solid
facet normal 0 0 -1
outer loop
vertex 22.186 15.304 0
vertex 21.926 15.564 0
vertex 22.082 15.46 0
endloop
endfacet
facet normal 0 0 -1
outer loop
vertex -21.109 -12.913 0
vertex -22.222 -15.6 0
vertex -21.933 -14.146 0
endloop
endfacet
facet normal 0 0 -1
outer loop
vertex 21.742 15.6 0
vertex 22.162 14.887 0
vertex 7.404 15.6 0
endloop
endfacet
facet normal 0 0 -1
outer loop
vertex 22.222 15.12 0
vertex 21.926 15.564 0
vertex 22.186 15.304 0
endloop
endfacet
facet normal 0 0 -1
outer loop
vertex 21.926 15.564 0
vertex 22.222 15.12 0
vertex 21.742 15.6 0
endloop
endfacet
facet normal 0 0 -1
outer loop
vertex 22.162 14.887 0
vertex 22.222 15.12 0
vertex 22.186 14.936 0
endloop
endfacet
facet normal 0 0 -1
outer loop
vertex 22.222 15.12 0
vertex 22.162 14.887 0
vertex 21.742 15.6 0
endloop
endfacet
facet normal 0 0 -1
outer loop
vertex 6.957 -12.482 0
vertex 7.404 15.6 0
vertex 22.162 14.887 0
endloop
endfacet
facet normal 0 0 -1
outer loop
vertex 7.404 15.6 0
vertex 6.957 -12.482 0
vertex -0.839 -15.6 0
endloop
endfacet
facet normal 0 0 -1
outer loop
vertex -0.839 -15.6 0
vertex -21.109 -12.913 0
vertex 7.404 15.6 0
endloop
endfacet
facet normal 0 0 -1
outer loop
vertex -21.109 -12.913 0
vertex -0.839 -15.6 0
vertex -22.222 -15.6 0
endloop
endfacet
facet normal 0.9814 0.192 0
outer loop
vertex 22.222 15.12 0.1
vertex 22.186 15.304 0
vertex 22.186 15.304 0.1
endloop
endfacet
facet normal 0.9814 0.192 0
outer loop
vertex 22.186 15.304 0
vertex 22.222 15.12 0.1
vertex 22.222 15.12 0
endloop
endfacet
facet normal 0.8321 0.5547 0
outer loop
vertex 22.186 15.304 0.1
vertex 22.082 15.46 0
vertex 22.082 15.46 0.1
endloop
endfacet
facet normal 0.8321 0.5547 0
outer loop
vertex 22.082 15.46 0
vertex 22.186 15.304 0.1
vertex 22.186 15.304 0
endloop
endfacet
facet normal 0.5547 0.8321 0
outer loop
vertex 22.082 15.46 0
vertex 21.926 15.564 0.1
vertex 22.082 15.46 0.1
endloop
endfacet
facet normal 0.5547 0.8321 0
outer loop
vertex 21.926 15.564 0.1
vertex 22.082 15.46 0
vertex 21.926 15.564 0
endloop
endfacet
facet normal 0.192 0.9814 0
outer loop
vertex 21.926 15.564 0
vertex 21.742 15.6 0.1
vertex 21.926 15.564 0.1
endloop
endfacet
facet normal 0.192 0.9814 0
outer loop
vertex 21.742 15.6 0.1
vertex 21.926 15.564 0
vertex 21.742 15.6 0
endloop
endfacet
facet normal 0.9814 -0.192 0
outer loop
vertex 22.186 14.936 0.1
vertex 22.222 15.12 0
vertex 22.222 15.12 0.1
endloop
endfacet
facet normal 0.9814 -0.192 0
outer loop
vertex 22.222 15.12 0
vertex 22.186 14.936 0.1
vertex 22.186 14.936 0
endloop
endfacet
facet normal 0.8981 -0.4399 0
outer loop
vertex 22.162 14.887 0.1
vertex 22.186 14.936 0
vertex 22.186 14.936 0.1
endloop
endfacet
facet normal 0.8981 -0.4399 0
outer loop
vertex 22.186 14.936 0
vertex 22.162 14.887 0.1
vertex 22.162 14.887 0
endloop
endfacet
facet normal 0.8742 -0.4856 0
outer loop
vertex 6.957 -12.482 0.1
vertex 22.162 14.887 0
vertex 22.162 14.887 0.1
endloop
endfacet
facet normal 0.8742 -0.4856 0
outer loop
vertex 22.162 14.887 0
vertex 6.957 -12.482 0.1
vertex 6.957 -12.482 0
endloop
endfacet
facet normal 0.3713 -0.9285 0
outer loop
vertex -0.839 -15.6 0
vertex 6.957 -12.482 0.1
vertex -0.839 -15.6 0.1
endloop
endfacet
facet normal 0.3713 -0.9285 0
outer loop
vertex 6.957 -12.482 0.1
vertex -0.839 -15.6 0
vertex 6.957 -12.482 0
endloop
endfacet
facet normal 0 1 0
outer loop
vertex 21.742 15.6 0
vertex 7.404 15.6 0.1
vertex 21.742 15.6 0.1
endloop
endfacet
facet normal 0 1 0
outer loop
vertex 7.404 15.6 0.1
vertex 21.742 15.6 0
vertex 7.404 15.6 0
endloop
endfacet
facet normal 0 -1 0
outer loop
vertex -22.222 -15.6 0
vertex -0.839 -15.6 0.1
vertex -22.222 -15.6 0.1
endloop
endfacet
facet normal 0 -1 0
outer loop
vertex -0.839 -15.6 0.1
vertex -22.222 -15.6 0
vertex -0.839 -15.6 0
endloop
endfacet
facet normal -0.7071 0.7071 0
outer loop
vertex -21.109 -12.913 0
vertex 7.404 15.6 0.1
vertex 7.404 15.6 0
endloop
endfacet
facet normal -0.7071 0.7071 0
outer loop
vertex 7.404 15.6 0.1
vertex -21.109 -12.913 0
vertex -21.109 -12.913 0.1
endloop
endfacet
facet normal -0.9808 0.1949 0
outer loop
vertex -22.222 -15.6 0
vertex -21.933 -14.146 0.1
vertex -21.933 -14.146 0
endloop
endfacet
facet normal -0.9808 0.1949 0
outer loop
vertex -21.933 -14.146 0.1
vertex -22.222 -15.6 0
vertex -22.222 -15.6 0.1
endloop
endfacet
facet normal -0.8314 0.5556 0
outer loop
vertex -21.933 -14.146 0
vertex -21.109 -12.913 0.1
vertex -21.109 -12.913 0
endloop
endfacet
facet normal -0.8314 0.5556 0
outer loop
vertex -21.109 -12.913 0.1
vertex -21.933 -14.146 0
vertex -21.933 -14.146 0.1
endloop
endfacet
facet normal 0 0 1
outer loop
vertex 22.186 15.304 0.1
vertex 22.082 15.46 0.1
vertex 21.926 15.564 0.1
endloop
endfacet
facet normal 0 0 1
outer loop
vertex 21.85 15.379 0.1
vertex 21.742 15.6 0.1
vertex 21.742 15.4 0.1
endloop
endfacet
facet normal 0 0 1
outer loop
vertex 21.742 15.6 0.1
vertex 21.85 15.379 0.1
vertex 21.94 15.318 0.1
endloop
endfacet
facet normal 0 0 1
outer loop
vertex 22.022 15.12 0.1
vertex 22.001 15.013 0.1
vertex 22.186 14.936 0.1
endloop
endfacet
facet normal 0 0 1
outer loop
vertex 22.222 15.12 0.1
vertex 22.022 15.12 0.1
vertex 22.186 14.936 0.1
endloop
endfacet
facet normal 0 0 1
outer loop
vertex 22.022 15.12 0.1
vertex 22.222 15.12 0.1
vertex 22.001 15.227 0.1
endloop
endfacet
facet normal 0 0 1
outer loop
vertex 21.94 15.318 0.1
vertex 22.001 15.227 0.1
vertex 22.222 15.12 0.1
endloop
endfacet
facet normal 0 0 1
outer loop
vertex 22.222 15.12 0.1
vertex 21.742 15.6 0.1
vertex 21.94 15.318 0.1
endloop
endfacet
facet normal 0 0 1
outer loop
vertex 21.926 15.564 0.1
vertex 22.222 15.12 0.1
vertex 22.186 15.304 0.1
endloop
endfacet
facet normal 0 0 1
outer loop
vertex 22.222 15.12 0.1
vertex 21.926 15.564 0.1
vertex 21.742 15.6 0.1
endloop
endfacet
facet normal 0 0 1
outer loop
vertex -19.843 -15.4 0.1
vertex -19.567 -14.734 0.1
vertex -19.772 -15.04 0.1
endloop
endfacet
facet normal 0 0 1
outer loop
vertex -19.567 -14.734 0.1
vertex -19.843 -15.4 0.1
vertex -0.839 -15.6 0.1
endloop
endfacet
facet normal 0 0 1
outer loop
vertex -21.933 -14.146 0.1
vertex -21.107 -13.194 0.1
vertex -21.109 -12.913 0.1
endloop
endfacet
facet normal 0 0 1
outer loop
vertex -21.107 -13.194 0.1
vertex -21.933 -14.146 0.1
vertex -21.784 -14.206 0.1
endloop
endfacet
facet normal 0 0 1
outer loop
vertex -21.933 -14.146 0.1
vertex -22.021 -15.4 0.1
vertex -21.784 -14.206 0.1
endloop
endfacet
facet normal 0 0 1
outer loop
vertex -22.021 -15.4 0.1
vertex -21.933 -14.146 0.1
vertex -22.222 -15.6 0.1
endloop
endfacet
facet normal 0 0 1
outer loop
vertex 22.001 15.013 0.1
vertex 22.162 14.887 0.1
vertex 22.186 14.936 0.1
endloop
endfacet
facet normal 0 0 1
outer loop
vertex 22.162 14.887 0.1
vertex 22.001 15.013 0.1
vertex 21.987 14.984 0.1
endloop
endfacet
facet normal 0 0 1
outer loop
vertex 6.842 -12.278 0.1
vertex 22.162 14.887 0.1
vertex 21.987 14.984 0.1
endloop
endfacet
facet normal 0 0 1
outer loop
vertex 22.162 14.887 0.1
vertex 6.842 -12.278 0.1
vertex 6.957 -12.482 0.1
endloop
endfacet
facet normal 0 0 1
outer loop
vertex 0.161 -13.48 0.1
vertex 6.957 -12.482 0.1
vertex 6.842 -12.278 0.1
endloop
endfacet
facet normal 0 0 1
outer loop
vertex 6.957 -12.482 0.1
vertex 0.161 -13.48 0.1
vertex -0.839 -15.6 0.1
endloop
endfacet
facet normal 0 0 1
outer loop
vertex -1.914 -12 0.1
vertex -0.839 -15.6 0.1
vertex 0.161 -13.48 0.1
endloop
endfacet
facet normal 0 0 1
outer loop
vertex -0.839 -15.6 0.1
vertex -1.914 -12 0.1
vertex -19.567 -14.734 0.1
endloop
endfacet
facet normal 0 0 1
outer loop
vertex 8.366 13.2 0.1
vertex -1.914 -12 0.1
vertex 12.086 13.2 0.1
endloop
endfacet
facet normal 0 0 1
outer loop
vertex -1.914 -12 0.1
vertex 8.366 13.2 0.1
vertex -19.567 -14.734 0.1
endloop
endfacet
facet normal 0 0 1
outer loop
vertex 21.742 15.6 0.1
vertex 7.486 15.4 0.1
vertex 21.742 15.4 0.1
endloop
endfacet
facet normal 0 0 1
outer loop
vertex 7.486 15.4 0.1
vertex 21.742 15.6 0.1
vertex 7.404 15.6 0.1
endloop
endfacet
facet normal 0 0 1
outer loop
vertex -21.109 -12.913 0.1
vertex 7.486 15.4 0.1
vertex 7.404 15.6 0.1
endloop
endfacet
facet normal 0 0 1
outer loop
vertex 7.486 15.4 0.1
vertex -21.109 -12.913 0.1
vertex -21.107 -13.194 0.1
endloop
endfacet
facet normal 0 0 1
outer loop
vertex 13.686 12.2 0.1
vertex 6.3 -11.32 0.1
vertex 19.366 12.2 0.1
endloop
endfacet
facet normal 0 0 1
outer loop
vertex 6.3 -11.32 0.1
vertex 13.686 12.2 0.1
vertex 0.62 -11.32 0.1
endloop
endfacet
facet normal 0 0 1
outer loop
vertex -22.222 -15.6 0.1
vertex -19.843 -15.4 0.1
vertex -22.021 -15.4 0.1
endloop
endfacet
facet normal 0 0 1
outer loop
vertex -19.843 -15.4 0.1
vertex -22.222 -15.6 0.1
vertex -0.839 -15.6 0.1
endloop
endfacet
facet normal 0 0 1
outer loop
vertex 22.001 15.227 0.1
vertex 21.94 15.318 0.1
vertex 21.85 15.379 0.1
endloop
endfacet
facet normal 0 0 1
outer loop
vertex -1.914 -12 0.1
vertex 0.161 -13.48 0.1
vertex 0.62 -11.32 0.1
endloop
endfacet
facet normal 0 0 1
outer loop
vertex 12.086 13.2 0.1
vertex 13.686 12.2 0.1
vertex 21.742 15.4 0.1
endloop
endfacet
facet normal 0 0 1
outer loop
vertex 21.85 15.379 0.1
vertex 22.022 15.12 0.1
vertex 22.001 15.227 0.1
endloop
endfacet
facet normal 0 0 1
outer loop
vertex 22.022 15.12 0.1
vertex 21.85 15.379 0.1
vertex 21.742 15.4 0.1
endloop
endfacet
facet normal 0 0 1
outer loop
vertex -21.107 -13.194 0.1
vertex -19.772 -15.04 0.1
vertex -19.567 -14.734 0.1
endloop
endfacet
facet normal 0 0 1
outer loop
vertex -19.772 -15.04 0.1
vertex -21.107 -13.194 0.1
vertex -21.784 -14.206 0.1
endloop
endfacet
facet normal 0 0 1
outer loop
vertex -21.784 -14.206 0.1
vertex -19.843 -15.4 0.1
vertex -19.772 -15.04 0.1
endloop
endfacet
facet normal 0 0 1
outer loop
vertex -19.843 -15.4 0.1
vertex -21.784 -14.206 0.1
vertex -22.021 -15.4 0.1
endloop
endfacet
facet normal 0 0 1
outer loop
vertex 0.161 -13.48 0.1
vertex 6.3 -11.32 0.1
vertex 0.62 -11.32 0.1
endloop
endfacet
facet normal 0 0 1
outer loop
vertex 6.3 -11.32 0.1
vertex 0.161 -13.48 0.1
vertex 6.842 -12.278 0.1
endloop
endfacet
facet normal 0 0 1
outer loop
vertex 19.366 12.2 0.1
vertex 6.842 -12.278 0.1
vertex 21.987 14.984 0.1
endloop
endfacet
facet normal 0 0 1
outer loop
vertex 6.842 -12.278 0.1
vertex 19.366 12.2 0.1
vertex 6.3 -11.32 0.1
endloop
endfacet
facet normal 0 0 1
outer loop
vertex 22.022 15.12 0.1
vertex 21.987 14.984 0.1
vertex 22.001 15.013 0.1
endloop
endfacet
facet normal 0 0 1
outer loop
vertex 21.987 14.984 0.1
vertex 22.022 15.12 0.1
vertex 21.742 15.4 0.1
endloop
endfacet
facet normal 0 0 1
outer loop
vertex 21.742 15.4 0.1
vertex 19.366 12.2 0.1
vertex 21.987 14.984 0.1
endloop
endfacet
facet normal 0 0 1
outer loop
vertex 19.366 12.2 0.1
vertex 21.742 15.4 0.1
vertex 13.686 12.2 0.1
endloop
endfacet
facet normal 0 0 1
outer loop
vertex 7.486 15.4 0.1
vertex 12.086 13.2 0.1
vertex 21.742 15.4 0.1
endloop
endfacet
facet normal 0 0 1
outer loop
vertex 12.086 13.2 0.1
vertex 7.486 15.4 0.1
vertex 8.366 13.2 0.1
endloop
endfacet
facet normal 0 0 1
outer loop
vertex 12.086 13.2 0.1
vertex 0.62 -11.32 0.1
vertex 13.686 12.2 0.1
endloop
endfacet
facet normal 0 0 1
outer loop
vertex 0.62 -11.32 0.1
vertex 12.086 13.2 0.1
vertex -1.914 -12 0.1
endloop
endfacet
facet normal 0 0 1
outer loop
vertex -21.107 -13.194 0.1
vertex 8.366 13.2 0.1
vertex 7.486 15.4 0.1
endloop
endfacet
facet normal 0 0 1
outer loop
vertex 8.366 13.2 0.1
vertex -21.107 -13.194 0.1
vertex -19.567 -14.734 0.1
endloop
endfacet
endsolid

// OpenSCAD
use <../lib.scad>
use <169665a.scad>
function ldraw_lib__169665b() = [
// 0 Sticker  3.9 x  5.6 with Black Space Shuttle Tail Lines Right Side
// 0 Name: 169665b.dat
// 0 Author: Chris Böhnke [KnightOfTarenta]
// 0 !LDRAW_ORG Part UPDATE 2026-06
// 0 !LICENSE Licensed under CC BY 4.0 : see CAreadme.txt
// 
// 0 BFC CERTIFY CCW
  [0,"BFC","CERTIFY"],
  [0,"BFC","CCW"],
// 
// 0 !KEYWORDS Bricklink 6339stk01, Brickowl 588738, Launch Command
// 0 !KEYWORDS Rebrickable 169665, set 6339, Shuttle Launch Pad, space port, town
// 
// 0 !HISTORY 2026-06-28 [OrionP] Official Update 2026-06
// 
// 1 16 0 0 0 -1 0 0 0 1 0 0 0 1 169665a.dat
  [1,16,0,0,0,-1,0,0,0,1,0,0,0,1, ldraw_lib__169665a()],
];
module ldraw_lib__169665b(step=0, col=false, unit=2/5, alt=false, line=0.2, solid=!$preview)
    makepoly(ldraw_lib__169665b(), step=step, col=col, unit=unit, alt=alt, line=line, solid=solid);
ldraw_lib__169665b(line=0.2);
